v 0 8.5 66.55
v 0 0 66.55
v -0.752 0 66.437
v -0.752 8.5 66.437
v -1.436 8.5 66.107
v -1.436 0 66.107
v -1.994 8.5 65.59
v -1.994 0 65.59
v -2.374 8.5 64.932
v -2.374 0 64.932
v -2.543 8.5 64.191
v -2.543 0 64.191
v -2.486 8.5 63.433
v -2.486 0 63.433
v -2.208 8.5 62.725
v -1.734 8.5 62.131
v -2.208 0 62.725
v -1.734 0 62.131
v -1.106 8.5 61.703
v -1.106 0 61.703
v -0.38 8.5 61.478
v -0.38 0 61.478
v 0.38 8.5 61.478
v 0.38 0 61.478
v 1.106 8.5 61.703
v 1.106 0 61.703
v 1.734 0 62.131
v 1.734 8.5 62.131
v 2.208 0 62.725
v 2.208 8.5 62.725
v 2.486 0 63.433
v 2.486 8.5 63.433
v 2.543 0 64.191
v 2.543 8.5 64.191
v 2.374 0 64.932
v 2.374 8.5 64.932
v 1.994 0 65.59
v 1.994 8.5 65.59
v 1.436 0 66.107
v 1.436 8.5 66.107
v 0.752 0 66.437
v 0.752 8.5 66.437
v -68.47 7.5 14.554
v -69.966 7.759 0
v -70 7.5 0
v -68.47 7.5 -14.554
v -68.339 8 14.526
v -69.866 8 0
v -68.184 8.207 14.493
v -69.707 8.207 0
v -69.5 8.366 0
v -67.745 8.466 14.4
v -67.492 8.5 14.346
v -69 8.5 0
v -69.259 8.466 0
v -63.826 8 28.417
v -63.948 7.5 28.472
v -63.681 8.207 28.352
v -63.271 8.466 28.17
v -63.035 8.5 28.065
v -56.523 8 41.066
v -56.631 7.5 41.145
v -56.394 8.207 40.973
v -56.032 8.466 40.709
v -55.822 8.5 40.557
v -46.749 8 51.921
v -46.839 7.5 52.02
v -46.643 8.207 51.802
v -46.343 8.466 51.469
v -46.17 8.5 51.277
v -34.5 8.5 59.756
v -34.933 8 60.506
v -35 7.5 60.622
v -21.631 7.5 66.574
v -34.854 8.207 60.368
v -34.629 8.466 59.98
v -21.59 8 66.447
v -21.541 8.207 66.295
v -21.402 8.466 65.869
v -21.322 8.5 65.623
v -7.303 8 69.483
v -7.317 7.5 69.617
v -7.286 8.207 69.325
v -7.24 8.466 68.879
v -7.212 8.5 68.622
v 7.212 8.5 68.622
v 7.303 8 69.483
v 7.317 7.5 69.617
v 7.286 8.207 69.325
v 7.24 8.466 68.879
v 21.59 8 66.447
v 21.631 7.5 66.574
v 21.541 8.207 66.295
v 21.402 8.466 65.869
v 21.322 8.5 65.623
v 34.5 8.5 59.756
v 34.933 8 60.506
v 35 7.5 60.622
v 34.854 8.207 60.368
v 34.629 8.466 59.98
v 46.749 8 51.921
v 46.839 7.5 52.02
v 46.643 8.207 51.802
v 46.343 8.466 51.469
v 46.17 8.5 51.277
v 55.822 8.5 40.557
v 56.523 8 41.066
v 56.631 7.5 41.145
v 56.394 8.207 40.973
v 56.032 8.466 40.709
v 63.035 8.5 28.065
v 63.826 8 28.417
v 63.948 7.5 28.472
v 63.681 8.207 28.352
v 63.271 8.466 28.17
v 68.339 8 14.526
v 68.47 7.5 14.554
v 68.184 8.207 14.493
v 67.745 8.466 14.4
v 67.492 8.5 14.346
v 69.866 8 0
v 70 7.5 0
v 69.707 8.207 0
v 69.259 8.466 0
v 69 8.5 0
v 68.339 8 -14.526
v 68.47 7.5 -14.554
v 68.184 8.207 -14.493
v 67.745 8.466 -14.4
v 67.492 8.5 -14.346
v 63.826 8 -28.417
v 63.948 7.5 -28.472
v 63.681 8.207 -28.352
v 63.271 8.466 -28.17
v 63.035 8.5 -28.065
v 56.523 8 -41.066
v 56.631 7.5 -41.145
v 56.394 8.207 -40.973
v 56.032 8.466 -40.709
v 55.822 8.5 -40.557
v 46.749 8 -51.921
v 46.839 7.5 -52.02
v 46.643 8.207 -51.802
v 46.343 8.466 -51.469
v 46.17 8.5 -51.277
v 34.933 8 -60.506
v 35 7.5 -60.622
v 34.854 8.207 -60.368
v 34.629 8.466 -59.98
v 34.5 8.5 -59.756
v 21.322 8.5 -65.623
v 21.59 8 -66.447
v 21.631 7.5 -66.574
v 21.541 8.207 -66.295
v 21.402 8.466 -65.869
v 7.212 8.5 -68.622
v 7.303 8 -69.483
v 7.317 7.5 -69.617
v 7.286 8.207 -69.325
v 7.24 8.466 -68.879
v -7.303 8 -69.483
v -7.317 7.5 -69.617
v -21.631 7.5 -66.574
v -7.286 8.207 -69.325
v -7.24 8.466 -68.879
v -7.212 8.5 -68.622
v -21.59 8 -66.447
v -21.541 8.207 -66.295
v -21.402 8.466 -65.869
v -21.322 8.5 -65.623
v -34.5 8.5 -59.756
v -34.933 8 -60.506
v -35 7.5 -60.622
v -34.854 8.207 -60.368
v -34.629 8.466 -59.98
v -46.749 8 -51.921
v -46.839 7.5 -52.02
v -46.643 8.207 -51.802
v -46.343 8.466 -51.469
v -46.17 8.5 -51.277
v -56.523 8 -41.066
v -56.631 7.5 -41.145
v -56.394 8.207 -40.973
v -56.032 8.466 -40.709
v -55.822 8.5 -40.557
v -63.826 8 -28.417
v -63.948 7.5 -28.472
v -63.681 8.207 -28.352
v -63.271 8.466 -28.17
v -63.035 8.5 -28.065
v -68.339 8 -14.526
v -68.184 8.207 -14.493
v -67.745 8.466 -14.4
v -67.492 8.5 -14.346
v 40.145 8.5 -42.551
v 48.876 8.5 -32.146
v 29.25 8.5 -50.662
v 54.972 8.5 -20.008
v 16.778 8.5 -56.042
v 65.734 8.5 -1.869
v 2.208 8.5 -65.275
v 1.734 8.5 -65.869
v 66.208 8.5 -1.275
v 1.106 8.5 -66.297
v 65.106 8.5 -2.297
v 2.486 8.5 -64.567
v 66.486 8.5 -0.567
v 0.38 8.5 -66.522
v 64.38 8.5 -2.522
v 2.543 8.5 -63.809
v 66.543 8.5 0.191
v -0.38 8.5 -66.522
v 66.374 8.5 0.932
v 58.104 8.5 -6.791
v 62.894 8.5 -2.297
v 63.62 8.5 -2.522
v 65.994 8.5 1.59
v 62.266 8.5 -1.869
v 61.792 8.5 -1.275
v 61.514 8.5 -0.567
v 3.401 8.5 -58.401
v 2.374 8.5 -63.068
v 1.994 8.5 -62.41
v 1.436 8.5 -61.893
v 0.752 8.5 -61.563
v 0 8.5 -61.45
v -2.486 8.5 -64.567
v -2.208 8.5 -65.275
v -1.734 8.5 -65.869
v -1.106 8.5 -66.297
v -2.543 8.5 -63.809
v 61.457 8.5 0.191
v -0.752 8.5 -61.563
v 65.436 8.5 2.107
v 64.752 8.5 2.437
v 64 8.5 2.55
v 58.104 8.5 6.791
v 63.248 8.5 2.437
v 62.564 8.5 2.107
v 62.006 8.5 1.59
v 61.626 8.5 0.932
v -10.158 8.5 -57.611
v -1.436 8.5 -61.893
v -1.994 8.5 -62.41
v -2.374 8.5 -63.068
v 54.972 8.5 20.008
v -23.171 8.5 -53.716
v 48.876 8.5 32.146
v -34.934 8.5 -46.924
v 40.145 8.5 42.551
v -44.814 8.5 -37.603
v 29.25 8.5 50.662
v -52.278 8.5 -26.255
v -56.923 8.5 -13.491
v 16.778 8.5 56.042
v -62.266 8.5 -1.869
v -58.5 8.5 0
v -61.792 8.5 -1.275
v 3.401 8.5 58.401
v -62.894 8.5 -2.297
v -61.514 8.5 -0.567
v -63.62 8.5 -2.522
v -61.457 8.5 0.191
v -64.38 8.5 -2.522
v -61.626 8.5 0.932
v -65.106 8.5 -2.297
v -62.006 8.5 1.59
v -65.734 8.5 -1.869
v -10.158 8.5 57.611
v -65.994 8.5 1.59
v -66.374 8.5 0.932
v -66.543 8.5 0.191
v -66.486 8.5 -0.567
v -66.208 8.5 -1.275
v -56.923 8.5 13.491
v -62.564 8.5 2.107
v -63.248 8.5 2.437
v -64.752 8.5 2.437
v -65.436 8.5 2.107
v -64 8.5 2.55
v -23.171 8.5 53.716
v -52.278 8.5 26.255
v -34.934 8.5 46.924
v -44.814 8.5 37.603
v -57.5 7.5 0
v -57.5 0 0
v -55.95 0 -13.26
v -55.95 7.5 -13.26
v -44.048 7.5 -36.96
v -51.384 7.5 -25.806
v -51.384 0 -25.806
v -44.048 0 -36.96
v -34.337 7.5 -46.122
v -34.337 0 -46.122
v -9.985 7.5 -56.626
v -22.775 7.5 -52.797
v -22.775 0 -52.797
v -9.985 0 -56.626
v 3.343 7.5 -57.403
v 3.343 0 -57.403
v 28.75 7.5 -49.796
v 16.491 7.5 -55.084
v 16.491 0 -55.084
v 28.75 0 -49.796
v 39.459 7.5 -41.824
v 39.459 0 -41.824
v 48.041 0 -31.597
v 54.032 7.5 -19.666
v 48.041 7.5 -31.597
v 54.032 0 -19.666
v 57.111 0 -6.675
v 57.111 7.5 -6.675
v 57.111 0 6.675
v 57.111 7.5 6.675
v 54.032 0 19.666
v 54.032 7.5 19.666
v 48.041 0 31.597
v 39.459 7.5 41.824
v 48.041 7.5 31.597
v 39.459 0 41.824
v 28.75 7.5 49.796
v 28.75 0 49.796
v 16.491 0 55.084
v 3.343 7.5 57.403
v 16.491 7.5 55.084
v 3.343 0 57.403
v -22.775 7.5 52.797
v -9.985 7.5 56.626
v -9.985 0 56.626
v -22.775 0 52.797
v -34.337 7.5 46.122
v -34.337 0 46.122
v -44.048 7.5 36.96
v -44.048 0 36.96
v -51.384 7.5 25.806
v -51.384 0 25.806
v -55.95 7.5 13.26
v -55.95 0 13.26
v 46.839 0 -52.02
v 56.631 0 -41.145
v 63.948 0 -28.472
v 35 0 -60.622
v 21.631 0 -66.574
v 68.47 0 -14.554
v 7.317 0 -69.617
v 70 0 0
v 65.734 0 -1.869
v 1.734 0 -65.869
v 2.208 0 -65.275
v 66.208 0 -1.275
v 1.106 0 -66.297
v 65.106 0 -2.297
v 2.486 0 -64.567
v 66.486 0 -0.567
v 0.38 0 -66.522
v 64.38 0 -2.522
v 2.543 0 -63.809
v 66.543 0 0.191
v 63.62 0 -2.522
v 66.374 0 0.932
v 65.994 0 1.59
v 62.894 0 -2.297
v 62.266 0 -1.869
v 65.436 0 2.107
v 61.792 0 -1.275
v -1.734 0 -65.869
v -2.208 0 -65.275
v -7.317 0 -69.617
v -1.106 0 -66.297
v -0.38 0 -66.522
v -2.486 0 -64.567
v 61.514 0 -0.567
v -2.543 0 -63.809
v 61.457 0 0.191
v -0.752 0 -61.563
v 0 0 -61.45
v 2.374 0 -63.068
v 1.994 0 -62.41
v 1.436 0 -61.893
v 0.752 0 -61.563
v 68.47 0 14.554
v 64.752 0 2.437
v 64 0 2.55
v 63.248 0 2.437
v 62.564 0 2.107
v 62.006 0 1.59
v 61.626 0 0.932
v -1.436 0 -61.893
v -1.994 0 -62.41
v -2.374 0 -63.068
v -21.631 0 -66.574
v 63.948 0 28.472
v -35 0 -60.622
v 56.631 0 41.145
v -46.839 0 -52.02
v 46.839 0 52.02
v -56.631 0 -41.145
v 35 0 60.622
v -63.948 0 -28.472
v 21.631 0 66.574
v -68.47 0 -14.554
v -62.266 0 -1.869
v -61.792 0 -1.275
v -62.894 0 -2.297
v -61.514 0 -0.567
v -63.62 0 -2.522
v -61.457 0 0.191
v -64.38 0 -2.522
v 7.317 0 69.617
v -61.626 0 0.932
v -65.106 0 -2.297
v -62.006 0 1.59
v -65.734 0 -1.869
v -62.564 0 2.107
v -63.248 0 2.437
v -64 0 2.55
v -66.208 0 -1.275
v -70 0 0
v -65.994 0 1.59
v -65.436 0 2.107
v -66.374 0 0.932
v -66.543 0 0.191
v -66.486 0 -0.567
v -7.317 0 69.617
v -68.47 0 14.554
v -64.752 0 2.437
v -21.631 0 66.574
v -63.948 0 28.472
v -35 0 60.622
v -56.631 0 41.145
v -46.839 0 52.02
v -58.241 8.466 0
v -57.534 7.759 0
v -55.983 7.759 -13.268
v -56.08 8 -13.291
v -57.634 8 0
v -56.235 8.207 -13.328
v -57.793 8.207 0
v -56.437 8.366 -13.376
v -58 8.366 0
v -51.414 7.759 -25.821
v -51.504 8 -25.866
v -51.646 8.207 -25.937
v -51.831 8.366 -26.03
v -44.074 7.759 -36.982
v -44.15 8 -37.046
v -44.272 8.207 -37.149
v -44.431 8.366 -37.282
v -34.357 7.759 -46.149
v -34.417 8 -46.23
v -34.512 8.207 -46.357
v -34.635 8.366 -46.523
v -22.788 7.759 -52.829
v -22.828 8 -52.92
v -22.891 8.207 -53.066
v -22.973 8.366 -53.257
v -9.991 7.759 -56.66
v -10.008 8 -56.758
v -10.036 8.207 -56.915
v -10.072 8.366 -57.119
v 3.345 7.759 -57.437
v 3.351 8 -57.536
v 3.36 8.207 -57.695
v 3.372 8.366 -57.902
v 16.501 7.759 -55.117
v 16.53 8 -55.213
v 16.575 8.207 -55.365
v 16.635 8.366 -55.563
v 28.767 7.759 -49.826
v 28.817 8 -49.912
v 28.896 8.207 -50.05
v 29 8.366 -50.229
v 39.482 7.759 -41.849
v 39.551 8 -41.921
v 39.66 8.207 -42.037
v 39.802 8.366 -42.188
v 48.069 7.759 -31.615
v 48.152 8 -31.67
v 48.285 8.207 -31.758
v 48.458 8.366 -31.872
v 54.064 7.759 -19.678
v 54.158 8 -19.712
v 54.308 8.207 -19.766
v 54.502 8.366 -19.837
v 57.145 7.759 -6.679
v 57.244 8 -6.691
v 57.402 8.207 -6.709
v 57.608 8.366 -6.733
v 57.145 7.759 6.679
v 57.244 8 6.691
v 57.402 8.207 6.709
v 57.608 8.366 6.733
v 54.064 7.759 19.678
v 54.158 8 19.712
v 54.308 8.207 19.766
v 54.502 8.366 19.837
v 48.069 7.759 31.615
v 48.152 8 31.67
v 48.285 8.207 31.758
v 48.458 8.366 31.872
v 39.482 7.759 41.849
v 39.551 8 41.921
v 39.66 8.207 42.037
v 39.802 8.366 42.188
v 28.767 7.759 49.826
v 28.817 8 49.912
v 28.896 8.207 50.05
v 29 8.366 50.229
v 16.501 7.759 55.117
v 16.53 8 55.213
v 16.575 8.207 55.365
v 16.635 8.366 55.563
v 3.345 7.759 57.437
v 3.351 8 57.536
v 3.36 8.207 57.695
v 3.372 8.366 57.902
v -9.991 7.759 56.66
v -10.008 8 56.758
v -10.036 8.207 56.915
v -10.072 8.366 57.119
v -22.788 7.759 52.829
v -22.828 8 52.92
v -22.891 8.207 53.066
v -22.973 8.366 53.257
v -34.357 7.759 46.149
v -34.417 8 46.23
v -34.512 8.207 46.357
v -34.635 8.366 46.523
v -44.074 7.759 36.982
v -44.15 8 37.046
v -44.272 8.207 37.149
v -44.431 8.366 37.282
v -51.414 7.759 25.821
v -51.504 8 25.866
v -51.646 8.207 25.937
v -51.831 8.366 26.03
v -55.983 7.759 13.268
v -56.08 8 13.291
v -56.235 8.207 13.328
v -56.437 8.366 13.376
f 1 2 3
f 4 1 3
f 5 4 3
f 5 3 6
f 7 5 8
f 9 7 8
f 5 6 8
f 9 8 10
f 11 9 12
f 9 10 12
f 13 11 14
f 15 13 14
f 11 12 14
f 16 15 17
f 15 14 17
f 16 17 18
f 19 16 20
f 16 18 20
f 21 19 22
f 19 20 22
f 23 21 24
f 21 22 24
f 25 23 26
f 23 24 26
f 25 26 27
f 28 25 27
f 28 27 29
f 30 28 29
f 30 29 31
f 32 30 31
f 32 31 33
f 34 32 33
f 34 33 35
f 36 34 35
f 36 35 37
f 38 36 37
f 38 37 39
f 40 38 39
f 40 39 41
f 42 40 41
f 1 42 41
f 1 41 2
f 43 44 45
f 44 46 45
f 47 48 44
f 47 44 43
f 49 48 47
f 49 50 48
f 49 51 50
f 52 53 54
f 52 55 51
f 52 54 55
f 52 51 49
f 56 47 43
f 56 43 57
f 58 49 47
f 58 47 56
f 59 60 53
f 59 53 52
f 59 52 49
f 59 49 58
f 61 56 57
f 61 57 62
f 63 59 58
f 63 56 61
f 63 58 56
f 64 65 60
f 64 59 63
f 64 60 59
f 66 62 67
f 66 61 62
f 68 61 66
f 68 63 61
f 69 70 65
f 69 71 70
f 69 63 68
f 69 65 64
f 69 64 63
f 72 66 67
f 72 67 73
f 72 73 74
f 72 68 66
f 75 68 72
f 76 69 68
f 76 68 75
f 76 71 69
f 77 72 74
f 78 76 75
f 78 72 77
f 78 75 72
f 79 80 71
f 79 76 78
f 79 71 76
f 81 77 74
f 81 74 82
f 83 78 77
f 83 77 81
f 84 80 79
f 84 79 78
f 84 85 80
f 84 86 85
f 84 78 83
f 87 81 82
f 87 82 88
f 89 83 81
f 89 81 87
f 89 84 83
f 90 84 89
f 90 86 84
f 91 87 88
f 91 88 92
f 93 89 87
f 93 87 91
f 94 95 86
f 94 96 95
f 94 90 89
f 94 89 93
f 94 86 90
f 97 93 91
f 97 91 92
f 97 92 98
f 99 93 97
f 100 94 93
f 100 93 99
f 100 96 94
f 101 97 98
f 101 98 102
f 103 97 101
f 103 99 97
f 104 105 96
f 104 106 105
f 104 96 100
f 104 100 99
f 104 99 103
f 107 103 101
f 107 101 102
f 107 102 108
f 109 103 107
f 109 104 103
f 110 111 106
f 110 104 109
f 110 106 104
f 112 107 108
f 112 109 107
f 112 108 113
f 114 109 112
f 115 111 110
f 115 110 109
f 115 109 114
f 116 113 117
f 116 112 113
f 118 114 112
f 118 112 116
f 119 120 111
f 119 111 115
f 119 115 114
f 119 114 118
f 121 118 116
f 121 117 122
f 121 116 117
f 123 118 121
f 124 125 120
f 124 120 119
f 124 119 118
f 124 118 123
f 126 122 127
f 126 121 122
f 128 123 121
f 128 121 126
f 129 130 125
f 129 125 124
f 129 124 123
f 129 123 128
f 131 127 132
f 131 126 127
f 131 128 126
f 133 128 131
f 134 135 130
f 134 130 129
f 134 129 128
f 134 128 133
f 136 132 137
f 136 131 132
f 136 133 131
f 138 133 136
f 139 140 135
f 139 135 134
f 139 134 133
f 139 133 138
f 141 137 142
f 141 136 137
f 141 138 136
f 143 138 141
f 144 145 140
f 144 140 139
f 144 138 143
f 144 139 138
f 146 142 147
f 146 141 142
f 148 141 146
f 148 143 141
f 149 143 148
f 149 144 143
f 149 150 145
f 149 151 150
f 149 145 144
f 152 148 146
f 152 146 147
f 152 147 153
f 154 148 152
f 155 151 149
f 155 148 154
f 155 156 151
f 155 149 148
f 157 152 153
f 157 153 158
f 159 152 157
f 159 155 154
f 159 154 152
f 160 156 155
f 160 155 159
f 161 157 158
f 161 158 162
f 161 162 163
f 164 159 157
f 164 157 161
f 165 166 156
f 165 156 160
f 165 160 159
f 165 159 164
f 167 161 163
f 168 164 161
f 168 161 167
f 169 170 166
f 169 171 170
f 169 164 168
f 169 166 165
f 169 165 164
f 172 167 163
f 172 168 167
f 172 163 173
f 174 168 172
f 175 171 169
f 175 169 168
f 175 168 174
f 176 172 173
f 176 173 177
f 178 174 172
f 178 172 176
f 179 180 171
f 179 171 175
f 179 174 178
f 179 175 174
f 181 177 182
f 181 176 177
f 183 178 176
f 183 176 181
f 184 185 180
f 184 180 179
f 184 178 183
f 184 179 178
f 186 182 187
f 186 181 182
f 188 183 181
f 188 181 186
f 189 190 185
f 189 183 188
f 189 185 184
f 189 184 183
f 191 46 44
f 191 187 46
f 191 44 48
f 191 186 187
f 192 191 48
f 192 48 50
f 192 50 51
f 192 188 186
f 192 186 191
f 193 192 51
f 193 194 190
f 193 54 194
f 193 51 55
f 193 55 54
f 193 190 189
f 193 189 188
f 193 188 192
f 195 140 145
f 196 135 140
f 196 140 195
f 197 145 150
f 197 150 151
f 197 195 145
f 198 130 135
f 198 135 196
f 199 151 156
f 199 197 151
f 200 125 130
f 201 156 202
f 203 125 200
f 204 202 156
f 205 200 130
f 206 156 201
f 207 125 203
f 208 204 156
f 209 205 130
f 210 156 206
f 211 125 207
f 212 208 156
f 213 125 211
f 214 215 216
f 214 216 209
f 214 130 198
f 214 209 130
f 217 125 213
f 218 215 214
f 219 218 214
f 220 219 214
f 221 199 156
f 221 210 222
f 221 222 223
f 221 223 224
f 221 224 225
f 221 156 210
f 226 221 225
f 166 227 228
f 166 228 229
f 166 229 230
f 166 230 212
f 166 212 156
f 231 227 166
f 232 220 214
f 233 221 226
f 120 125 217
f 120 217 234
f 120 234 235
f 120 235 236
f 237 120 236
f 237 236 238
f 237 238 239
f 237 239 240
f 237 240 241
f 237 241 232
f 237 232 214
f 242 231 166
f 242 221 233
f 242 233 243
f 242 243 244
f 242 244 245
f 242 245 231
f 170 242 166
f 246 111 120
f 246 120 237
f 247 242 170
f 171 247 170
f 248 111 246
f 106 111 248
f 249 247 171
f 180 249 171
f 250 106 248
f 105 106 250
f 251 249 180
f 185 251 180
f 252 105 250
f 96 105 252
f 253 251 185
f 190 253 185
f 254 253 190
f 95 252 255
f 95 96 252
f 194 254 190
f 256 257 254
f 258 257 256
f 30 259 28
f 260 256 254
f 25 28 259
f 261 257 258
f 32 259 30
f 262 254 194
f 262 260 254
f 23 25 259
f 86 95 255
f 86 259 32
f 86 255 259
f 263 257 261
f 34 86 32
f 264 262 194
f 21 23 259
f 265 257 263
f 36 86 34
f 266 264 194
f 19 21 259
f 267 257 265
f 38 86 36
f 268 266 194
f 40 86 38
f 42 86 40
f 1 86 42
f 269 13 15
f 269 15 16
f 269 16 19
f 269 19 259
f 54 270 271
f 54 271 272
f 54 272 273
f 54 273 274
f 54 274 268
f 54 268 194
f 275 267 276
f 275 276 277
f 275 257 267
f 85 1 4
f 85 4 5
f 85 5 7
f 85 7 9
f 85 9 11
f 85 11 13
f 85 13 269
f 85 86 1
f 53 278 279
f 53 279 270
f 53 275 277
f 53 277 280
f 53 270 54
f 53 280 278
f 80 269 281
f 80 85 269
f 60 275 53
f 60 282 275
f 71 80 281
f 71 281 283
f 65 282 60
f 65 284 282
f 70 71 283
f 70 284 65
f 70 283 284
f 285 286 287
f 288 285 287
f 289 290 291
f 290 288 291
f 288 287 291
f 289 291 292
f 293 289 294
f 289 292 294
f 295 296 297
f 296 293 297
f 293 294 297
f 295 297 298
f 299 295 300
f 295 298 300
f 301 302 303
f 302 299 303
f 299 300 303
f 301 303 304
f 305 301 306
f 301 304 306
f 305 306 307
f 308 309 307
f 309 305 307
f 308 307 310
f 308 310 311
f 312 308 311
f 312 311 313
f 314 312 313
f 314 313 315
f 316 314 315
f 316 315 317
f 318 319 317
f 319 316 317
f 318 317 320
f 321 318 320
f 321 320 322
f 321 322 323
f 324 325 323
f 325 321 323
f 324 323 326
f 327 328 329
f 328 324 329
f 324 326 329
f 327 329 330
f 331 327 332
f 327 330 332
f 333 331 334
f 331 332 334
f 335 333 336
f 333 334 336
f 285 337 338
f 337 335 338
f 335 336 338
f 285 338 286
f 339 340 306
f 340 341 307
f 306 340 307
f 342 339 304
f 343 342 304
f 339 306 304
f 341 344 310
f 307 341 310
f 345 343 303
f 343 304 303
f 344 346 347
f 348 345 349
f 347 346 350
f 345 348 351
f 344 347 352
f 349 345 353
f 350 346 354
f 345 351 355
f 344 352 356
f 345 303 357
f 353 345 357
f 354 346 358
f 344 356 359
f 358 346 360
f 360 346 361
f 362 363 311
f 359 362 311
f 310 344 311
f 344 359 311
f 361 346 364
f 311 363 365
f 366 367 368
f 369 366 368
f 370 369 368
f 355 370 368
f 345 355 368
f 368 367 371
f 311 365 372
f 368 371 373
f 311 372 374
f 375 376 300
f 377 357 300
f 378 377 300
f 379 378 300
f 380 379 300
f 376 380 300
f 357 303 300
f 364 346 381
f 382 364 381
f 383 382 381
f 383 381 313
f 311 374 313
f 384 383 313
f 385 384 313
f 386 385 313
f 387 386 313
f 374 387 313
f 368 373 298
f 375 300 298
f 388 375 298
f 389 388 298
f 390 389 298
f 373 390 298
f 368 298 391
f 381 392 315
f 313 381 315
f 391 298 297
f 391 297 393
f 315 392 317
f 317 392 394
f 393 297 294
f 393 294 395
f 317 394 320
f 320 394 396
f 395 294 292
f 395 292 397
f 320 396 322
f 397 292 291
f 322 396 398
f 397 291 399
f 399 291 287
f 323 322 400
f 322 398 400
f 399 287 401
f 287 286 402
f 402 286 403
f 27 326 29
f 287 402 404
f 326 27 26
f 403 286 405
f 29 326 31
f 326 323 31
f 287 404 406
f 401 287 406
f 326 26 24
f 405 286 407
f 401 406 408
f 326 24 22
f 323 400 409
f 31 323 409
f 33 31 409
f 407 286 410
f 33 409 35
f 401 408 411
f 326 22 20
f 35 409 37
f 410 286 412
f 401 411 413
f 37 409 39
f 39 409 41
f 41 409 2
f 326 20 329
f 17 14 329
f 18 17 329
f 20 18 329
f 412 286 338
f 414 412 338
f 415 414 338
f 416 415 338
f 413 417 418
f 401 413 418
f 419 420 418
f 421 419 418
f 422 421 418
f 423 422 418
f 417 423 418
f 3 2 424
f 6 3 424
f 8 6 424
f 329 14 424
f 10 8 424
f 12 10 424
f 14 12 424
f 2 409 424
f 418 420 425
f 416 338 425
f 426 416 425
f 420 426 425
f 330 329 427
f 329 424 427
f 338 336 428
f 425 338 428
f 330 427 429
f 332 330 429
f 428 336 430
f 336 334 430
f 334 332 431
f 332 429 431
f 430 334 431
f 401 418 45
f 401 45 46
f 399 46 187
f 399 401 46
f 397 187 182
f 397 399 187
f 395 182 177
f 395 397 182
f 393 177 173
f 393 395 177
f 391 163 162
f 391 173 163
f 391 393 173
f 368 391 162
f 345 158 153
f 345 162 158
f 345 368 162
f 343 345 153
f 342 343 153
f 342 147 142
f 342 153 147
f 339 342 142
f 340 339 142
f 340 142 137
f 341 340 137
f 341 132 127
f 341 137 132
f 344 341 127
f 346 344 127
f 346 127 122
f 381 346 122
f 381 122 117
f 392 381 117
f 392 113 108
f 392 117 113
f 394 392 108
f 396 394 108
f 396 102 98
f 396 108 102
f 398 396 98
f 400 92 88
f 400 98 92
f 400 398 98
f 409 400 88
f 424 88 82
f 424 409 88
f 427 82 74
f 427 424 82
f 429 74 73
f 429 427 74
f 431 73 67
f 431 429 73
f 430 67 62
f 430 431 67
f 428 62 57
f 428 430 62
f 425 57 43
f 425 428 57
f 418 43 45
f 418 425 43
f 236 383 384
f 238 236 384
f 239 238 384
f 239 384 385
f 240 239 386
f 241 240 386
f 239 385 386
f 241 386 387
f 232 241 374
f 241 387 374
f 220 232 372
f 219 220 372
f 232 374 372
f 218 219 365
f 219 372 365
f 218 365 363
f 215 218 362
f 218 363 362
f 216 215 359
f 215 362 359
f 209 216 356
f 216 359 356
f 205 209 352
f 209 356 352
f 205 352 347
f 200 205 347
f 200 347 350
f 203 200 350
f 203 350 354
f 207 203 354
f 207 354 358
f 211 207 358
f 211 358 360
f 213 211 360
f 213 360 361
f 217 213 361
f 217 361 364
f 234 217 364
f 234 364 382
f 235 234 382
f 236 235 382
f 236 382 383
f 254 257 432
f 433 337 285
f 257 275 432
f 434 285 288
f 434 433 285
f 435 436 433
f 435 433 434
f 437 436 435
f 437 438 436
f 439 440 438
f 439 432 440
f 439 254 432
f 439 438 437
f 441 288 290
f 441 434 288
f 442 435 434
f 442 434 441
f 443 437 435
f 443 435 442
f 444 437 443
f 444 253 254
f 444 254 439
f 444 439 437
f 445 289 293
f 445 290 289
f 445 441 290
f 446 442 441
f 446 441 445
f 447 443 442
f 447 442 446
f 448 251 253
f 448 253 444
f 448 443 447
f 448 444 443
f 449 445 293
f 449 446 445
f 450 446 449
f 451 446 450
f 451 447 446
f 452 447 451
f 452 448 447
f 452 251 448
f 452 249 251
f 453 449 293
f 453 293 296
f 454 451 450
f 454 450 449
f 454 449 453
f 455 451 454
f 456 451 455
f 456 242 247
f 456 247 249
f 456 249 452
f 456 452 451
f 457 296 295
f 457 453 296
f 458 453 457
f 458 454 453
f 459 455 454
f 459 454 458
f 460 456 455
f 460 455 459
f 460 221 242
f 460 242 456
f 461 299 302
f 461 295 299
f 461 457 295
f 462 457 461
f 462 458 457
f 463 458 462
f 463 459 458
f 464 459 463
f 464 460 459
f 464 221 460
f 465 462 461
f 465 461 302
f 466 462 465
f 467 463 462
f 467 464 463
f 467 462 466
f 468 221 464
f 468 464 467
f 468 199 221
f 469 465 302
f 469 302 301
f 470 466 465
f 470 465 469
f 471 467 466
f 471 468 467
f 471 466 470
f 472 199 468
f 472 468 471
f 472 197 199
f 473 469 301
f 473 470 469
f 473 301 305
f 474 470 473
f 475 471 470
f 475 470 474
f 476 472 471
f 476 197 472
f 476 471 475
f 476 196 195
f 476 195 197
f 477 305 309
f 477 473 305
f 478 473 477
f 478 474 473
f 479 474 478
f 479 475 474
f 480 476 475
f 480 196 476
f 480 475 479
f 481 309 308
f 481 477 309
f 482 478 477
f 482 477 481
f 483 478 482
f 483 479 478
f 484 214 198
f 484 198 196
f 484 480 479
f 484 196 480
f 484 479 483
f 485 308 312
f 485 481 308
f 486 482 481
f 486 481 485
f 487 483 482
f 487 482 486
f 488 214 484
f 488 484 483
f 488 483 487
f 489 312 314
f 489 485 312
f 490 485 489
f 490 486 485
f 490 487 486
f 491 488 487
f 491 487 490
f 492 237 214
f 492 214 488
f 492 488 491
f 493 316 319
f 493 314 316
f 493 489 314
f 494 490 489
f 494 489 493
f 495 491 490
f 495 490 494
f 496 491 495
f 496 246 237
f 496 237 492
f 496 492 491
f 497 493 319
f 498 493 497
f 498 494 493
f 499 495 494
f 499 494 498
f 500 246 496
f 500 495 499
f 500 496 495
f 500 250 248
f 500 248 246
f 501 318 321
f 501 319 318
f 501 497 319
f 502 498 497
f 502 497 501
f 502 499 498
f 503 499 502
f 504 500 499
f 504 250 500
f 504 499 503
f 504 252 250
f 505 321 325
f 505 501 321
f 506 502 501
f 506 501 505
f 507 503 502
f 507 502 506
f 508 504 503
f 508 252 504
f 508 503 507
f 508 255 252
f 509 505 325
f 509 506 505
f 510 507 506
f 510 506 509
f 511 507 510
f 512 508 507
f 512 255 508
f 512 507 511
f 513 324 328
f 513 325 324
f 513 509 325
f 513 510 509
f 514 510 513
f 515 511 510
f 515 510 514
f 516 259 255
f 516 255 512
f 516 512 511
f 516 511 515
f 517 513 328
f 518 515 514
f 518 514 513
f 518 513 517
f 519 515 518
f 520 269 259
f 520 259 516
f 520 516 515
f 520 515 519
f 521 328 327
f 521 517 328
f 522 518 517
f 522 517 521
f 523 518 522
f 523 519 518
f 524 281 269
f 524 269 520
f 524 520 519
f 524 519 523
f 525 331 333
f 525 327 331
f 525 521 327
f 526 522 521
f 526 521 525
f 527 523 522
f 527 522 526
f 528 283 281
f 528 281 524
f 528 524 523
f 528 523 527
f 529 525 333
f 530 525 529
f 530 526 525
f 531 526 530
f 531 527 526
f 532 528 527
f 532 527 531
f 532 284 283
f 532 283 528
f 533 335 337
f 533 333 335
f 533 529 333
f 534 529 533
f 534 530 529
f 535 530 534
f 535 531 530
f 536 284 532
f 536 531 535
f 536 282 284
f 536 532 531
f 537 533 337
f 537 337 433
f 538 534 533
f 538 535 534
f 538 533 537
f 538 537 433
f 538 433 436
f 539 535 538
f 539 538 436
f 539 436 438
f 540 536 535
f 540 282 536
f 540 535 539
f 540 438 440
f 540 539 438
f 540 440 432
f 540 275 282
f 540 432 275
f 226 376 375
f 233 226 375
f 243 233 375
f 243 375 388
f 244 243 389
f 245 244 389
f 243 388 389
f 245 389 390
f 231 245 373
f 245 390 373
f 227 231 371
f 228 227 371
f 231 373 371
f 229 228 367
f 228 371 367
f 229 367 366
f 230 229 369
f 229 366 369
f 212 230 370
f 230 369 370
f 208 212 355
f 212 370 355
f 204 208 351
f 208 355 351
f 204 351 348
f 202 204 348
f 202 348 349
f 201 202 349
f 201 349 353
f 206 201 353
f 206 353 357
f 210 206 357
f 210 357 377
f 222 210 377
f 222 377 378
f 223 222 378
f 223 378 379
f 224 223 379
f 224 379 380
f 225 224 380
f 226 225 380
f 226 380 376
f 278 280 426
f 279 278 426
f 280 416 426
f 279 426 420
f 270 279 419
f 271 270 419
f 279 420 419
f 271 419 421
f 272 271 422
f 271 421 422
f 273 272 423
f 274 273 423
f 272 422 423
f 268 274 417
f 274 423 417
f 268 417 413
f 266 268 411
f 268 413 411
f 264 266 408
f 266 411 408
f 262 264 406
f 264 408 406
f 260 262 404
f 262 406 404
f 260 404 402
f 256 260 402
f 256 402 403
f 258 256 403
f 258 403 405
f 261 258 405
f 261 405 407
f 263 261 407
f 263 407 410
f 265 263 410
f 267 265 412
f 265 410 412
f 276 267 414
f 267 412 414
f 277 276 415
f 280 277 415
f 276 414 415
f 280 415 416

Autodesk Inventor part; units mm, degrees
ref_plane "YZ Plane" through (0, 0, 0) normal (1, 0, 0) x (0, 1, 0)
ref_plane "XZ Plane" through (0, 0, 0) normal (0, 1, 0) x (-1, 0, 0)
ref_plane "XY Plane" through (0, 0, 0) normal (0, 0, 1) x (1, 0, 0)
sketch "スケッチ1" plane through (0, 0, 0) normal (0, 1, 0) x (-1, 0, 0)
  circle A0 centre (0, 0) radius 57.5
  circle A1 centre (0, 0) radius 70
  dimension "d0" = 115
  dimension "d1" = 140
extrude "押し出し1" add sketch "スケッチ1" along normal blind 8.5
fillet "フィレット1" radius 1 2 edges at (57.5, 8.5, 0) (70, 8.5, 0)
sketch "スケッチ3" plane through (0, 8.5, 0) normal (0, 1, 0) x (1, 0, 0)
  circle A0 centre (0, 0) radius 64
  point P0 (0, 64)
  point P1 (64, 0)
  point P2 (0, -64)
  point P3 (-64, 0)
  dimension "d19" = 128
hole "穴2" at (0, 8.5, -64) at (64, 8.5, 0) at (0, 8.5, 64) at (-64, 8.5, 0) direction (0, -1, 0) diameter 5.1 end through all
properties part number "turntable_out_8_23" material "アルミニウム 6061-AHC"
